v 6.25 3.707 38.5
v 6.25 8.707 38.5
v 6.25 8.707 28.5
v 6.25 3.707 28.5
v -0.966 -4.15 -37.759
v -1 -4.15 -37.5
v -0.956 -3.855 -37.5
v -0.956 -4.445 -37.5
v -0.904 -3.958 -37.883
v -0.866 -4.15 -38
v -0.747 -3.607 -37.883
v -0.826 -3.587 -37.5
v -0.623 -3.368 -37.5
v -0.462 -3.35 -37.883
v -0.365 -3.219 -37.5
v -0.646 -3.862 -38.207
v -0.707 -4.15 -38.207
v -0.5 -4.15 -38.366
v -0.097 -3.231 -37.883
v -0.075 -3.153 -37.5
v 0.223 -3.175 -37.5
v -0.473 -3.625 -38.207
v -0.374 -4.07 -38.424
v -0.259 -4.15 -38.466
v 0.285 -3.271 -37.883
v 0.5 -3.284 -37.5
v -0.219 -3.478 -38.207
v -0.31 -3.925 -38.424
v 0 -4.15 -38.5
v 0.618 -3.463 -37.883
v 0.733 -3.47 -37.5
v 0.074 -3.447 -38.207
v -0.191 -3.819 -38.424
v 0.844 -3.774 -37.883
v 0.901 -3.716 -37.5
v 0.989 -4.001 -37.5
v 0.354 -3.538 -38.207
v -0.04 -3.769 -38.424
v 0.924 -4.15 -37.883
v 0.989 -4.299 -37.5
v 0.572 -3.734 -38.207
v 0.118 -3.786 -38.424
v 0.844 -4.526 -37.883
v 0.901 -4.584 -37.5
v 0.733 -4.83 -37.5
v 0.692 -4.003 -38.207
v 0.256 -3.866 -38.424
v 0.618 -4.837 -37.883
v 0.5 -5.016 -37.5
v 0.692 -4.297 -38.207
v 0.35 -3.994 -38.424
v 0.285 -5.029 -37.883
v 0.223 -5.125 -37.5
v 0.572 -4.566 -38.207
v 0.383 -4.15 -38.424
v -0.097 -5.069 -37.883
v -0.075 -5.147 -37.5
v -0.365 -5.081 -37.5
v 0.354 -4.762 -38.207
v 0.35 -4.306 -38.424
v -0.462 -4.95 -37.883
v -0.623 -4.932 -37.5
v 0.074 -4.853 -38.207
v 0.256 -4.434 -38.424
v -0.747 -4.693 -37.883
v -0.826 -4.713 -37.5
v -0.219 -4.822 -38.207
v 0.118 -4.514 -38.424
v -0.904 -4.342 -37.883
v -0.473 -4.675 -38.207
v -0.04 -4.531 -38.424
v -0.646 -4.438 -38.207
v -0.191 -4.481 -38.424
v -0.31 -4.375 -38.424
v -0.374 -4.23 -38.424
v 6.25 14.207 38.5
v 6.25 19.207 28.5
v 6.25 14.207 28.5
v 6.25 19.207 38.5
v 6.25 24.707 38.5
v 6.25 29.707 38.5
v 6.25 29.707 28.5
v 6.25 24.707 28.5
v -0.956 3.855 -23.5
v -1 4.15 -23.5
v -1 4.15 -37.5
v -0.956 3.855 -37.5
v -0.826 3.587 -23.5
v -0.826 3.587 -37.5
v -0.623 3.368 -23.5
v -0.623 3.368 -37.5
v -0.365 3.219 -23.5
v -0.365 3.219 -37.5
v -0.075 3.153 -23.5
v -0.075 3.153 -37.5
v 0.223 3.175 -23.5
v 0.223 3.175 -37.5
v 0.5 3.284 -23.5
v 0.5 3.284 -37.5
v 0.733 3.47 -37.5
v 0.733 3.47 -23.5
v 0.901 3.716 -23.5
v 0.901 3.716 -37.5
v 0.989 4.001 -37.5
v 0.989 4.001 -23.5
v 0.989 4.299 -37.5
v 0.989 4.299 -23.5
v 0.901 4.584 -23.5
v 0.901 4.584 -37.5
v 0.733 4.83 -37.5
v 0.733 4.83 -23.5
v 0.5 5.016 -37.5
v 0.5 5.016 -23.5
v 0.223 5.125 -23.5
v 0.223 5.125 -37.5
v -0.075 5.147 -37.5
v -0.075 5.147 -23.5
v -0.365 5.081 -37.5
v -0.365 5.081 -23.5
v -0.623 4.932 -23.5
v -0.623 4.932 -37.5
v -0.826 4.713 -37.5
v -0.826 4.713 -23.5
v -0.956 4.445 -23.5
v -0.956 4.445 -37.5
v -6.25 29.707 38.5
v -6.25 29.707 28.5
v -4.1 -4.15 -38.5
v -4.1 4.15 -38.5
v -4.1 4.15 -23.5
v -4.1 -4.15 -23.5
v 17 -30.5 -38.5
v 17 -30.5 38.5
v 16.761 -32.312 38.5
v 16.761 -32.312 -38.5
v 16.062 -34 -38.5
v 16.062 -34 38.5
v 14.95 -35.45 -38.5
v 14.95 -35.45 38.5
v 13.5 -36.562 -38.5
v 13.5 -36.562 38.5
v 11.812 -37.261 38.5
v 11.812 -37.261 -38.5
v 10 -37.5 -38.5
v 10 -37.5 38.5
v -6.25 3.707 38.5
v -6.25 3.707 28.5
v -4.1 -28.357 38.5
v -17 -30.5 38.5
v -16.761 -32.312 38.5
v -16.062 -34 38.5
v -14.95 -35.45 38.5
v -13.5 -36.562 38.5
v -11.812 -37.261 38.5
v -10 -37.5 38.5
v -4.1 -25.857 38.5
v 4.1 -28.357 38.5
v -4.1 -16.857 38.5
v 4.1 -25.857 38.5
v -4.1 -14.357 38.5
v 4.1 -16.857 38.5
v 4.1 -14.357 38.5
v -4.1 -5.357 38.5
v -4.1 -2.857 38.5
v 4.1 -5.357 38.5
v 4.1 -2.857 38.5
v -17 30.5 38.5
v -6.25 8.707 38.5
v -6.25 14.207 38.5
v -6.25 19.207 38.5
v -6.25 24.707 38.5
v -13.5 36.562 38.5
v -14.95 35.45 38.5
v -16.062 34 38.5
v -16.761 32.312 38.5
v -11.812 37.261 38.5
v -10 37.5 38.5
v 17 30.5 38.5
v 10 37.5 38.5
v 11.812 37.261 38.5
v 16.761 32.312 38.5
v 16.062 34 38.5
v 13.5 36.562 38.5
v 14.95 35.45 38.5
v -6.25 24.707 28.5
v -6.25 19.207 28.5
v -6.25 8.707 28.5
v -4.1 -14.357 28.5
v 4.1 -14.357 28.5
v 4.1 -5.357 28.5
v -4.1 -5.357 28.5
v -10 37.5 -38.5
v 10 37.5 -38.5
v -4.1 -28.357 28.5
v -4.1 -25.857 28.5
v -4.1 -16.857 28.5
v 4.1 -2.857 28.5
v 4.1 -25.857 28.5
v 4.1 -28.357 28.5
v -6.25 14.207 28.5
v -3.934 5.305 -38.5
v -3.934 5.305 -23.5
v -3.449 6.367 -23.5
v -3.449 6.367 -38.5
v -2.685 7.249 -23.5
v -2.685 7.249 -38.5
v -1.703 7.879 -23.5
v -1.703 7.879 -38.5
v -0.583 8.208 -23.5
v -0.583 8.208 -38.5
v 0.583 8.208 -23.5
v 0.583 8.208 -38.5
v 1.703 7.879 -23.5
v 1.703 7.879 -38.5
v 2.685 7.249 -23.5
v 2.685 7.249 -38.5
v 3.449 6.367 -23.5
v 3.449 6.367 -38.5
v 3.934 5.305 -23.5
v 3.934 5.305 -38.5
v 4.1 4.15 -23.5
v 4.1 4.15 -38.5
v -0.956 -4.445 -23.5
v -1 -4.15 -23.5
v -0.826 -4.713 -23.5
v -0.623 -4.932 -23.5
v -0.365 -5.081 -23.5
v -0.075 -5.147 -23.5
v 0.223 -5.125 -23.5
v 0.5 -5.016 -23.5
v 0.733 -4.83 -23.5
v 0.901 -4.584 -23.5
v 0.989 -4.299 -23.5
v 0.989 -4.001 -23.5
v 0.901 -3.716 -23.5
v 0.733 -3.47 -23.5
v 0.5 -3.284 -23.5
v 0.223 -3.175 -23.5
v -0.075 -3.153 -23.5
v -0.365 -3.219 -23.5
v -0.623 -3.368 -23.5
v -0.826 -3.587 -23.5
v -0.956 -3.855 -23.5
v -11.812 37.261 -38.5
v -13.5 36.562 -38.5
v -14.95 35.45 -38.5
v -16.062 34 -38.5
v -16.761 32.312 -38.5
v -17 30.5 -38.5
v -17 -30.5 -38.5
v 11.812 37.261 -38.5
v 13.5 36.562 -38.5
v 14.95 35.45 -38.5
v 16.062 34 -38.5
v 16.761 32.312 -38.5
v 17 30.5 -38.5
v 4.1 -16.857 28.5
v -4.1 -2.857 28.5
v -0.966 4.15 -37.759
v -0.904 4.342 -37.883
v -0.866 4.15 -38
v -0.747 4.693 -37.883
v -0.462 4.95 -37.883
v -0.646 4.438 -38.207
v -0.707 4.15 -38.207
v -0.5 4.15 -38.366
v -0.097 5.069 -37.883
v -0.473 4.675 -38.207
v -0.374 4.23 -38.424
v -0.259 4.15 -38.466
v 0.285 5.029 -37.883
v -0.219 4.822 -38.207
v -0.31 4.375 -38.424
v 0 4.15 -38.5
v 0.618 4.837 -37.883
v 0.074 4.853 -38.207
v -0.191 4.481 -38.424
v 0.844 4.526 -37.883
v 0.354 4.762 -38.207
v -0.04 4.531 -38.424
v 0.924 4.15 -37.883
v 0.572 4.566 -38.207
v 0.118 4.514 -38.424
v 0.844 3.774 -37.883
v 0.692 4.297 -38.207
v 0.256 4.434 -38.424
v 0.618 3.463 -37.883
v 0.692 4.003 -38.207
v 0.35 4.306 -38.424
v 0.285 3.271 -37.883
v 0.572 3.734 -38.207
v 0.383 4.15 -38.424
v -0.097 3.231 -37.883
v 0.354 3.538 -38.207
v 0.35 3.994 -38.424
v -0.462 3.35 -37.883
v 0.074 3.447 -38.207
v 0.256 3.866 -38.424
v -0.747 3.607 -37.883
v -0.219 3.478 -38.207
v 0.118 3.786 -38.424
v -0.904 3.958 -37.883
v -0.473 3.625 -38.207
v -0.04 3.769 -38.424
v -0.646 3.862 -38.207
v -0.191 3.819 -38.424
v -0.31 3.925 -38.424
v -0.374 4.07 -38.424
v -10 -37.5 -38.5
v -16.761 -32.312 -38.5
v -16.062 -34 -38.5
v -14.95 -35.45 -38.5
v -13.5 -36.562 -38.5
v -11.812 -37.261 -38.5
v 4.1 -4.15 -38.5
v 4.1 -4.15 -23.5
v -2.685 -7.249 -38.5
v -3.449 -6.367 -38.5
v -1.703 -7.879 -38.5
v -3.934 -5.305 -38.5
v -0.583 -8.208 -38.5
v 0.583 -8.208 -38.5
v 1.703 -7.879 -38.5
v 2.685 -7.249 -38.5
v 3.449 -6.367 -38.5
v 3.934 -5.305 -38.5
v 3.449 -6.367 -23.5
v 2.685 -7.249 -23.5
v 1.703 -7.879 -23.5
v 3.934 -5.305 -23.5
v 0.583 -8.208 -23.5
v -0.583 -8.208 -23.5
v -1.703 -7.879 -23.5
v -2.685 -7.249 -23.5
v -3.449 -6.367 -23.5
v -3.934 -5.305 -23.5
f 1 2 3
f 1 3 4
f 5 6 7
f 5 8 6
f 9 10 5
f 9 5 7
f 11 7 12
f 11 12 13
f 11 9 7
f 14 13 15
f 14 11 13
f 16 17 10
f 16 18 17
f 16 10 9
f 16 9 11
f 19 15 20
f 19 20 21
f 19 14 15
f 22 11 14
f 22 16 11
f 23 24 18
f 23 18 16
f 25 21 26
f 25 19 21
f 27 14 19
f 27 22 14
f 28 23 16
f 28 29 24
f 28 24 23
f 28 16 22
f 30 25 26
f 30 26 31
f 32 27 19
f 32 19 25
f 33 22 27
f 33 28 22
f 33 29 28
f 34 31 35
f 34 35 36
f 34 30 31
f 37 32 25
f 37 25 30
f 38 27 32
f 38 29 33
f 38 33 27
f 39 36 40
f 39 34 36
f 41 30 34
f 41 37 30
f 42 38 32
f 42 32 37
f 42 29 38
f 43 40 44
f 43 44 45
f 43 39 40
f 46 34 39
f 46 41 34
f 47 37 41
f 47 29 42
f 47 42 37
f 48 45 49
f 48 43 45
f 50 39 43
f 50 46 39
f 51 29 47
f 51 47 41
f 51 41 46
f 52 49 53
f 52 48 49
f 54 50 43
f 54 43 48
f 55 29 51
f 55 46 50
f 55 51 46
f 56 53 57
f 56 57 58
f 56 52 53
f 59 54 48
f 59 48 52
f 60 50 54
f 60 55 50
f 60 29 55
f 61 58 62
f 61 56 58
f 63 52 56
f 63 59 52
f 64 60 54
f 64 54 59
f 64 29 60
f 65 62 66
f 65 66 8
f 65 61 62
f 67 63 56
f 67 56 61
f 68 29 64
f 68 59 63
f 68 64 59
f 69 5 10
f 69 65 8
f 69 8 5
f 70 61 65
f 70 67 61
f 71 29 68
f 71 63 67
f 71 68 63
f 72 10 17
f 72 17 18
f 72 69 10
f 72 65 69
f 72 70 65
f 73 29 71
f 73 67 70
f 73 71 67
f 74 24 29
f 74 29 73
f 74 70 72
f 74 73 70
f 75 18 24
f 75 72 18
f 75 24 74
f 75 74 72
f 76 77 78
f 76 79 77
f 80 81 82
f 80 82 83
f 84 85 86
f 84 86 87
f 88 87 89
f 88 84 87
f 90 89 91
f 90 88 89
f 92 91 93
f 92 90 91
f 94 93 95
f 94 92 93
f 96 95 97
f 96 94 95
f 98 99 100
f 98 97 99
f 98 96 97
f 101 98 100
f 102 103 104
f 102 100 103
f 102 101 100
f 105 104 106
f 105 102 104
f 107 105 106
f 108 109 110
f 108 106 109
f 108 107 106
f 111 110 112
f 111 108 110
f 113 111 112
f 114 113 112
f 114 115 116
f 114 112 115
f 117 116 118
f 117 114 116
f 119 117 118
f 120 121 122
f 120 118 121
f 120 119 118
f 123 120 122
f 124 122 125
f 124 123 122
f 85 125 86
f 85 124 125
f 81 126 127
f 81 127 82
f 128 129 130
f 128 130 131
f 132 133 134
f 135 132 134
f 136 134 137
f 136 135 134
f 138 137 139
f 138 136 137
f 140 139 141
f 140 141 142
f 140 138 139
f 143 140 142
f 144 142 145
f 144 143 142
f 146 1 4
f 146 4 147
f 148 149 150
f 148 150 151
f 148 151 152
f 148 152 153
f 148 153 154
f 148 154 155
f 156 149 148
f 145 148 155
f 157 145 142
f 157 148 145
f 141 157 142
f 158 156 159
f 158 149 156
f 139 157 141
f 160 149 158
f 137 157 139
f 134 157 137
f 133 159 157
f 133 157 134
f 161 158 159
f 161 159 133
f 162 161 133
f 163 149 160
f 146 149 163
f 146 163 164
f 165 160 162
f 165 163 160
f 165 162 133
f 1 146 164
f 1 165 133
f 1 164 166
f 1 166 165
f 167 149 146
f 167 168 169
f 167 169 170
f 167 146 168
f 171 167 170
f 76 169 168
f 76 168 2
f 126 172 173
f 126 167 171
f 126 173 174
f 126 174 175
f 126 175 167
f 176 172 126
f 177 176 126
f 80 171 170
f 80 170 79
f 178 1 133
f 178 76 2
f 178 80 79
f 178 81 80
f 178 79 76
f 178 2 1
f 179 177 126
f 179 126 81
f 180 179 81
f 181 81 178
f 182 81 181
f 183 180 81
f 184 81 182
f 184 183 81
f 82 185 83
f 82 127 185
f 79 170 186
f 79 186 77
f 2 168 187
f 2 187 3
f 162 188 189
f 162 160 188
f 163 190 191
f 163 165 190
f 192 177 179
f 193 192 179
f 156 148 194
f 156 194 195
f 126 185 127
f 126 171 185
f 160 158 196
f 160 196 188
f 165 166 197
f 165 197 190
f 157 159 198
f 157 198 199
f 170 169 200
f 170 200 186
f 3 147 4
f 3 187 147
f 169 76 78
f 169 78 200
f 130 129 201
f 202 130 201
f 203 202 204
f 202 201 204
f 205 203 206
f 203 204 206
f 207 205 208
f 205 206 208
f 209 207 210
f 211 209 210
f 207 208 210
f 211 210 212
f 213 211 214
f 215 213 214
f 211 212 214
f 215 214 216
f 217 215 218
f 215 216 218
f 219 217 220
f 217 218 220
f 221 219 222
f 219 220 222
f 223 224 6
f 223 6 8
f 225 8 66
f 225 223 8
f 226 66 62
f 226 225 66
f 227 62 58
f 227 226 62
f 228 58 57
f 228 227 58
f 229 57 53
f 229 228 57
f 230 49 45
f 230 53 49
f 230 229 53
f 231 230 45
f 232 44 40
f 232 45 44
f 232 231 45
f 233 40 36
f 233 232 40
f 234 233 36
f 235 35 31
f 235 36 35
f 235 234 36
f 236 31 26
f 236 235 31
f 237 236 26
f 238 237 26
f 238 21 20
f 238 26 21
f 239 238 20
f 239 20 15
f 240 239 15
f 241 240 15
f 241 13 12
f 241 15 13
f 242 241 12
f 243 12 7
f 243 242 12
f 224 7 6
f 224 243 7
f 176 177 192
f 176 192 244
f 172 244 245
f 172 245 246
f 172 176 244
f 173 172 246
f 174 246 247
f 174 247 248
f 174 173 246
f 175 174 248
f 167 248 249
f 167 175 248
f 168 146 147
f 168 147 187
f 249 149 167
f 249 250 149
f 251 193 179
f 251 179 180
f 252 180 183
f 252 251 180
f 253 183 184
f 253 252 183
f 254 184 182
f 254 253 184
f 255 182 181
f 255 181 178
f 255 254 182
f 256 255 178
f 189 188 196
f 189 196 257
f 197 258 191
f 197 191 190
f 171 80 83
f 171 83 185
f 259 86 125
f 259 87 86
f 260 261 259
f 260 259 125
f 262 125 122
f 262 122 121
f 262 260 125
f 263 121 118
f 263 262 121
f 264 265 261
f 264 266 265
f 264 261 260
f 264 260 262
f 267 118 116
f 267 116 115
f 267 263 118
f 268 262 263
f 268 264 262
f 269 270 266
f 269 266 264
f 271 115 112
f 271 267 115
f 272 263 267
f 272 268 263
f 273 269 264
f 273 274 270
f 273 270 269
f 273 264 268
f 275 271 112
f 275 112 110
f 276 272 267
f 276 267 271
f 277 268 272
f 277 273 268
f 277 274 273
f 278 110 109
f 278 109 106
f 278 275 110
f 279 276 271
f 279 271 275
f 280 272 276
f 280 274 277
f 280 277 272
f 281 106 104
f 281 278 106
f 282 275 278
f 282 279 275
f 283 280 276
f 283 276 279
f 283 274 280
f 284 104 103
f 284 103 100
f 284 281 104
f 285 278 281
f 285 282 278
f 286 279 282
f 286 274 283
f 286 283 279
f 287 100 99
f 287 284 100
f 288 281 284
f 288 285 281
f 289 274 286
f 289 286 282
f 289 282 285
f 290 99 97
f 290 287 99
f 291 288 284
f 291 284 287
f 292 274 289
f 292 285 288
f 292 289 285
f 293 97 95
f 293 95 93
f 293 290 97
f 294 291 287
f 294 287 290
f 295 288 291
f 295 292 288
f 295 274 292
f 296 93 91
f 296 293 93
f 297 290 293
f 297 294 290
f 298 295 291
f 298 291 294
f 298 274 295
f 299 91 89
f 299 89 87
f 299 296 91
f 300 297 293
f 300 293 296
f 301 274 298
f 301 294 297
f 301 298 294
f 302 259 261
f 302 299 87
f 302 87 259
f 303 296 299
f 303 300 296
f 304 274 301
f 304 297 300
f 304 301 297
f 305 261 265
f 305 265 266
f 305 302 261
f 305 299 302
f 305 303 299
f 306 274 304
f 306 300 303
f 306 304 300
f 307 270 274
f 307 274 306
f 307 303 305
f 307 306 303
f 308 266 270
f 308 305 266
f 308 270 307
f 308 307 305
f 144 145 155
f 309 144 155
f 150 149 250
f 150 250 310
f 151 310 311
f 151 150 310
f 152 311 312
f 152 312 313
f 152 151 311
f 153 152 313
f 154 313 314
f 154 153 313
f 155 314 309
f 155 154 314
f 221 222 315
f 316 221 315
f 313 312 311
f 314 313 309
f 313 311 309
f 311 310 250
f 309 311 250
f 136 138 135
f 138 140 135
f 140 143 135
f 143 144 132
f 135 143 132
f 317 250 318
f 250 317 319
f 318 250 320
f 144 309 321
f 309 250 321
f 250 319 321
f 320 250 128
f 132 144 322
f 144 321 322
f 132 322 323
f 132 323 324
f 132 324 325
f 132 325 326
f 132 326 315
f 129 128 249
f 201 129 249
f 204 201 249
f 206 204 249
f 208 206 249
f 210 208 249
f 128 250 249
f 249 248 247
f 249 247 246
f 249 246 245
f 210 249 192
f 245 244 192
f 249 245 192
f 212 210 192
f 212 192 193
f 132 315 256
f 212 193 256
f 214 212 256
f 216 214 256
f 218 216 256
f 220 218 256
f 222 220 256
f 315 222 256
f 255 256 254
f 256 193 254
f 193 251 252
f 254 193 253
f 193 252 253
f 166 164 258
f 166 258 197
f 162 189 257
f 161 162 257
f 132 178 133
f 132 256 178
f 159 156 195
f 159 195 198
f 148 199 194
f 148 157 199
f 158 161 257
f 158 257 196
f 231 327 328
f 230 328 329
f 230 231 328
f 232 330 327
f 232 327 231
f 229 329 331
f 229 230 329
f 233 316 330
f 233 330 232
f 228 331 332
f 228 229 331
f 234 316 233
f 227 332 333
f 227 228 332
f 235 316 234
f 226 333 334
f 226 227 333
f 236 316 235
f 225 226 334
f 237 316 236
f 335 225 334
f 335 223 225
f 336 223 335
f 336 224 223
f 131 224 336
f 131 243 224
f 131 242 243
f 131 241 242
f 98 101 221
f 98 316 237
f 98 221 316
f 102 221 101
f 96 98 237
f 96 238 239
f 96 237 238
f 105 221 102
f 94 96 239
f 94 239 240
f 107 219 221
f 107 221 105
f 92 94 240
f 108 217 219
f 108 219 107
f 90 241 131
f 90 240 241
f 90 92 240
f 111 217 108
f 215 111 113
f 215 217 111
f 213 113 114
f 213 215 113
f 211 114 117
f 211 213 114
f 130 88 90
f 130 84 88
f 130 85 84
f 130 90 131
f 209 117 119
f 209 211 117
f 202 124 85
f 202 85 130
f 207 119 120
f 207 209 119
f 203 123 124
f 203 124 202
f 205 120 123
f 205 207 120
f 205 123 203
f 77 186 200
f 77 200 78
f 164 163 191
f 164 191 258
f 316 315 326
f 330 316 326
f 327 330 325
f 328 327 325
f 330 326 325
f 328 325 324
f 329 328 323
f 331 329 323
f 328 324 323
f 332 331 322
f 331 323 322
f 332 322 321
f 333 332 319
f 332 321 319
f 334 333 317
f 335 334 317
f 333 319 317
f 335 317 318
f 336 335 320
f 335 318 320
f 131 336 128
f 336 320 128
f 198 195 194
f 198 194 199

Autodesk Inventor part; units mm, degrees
ref_plane "YZ Plane" through (0, 0, 0) normal (1, 0, 0) x (0, 1, 0)
ref_plane "XZ Plane" through (0, 0, 0) normal (0, 1, 0) x (-1, 0, 0)
ref_plane "XY Plane" through (0, 0, 0) normal (0, 0, 1) x (1, 0, 0)
sketch "Sketch1" plane through (0, 0, 0) normal (0, 0, 1) x (1, 0, 0)
  line L0 (-17, 37.5) -> (17, 37.5)
  line L1 (17, 37.5) -> (17, -37.5)
  line L2 (17, -37.5) -> (-17, -37.5)
  line L3 (-17, -37.5) -> (-17, 37.5)
  line L4 (-17, 37.5) -> (17, -37.5) construction
  line L5 (17, 37.5) -> (-17, -37.5) construction
  point P0 (0, 0)
  dimension "d0" = 34
  dimension "d1" = 75
extrude "Extrusion1" add sketch "Sketch1" along normal mid plane 77
fillet "Fillet1" radius 7 4 edges at (17, 37.5, 0) (-17, 37.5, 0) (17, -37.5, 0) (-17, -37.5, 0)
sketch "Sketch2" plane through (0, 0, -38.5) normal (0, 0, -1) x (-1, 0, 0)
  circle A0 centre (0, 4.15) radius 4.1
  circle A1 centre (0, -4.15) radius 4.1
  line L0 (0, 0) -> (24.0198, 0) construction
  line L1 (-4.1, 4.15) -> (-4.1, -4.15)
  line L2 (4.1, 4.15) -> (4.1, -4.15)
  dimension "d5" = 8.2
  dimension "d6" = 16.5
extrude "Extrusion2" cut sketch "Sketch2" against normal blind 15
sketch "Sketch3" plane through (0, 0, -23.5) normal (0, 0, -1) x (-1, 0, 0)
  circle A0 centre (0, 4.15) radius 1
  circle A1 centre (0, -4.15) radius 1
  arc A2 (4.1, 4.15) -> (-4.1, 4.15) centre (0, 4.15) ccw projected
  arc A3 (-4.1, -4.15) -> (4.1, -4.15) centre (0, -4.15) ccw projected
  point P0 (0, 0)
  dimension "d9" = 2
extrude "Extrusion3" add sketch "Sketch3" along normal blind 15
fillet "Fillet2" radius 1 2 edges at (1, 4.15, -38.5) (1, -4.15, -38.5)
sketch "Sketch4" plane through (0, 0, 38.5) normal (0, 0, 1) x (1, 0, 0)
  line L0 (-6.25, 29.7073) -> (6.25, 29.7073)
  line L1 (6.25, 29.7073) -> (6.25, 24.7073)
  line L2 (6.25, 24.7073) -> (-6.25, 24.7073)
  line L3 (-6.25, 24.7073) -> (-6.25, 29.7073)
  line L4 (-6.25, 29.7073) -> (6.25, 24.7073) construction
  line L5 (6.25, 29.7073) -> (-6.25, 24.7073) construction
  line L6 (-6.25, 19.2073) -> (6.25, 19.2073)
  line L7 (6.25, 19.2073) -> (6.25, 14.2073)
  line L8 (6.25, 14.2073) -> (-6.25, 14.2073)
  line L9 (-6.25, 14.2073) -> (-6.25, 19.2073)
  line L10 (-6.25, 19.2073) -> (6.25, 14.2073) construction
  line L11 (6.25, 19.2073) -> (-6.25, 14.2073) construction
  line L12 (-6.25, 8.7073) -> (6.25, 8.7073)
  line L13 (6.25, 8.7073) -> (6.25, 3.7073)
  line L14 (6.25, 3.7073) -> (-6.25, 3.7073)
  line L15 (-6.25, 3.7073) -> (-6.25, 8.7073)
  line L16 (-6.25, 8.7073) -> (6.25, 3.7073) construction
  line L17 (6.25, 8.7073) -> (-6.25, 3.7073) construction
  line L18 (-4.1, -2.8572) -> (4.1, -2.8572)
  line L19 (4.1, -2.8572) -> (4.1, -5.3572)
  line L20 (4.1, -5.3572) -> (-4.1, -5.3572)
  line L21 (-4.1, -5.3572) -> (-4.1, -2.8572)
  line L22 (-4.1, -2.8572) -> (4.1, -5.3572) construction
  line L23 (4.1, -2.8572) -> (-4.1, -5.3572) construction
  line L24 (-4.1, -14.3572) -> (4.1, -14.3572)
  line L25 (4.1, -14.3572) -> (4.1, -16.8572)
  line L26 (4.1, -16.8572) -> (-4.1, -16.8572)
  line L27 (-4.1, -16.8572) -> (-4.1, -14.3572)
  line L28 (-4.1, -14.3572) -> (4.1, -16.8572) construction
  line L29 (4.1, -14.3572) -> (-4.1, -16.8572) construction
  line L30 (-4.1, -25.8572) -> (4.1, -25.8572)
  line L31 (4.1, -25.8572) -> (4.1, -28.3572)
  line L32 (4.1, -28.3572) -> (-4.1, -28.3572)
  line L33 (-4.1, -28.3572) -> (-4.1, -25.8572)
  line L34 (-4.1, -25.8572) -> (4.1, -28.3572) construction
  line L35 (4.1, -25.8572) -> (-4.1, -28.3572) construction
  point P0 (0, 0)
  point P1 (0, 27.2073)
  point P2 (0, 16.7073)
  point P3 (0, 6.2073)
  point P4 (0, -4.1072)
  point P5 (0, -15.6072)
  point P6 (0, -27.1072)
  dimension "d5" = 8.2
  dimension "d6" = 16.5
  dimension "d14" = 12.5
  dimension "d15" = 5
  dimension "d16" = 5.5
  dimension "d17" = 5.5
  dimension "d18" = 8.2
  dimension "d19" = 2.5
  dimension "d20" = 9
  dimension "d21" = 9
extrude "Extrusion4" cut sketch "Sketch4" against normal blind 10
equation "\"d17\" = d16"
equation "\"d21\" = d20"
properties part number "PowerUSB"
